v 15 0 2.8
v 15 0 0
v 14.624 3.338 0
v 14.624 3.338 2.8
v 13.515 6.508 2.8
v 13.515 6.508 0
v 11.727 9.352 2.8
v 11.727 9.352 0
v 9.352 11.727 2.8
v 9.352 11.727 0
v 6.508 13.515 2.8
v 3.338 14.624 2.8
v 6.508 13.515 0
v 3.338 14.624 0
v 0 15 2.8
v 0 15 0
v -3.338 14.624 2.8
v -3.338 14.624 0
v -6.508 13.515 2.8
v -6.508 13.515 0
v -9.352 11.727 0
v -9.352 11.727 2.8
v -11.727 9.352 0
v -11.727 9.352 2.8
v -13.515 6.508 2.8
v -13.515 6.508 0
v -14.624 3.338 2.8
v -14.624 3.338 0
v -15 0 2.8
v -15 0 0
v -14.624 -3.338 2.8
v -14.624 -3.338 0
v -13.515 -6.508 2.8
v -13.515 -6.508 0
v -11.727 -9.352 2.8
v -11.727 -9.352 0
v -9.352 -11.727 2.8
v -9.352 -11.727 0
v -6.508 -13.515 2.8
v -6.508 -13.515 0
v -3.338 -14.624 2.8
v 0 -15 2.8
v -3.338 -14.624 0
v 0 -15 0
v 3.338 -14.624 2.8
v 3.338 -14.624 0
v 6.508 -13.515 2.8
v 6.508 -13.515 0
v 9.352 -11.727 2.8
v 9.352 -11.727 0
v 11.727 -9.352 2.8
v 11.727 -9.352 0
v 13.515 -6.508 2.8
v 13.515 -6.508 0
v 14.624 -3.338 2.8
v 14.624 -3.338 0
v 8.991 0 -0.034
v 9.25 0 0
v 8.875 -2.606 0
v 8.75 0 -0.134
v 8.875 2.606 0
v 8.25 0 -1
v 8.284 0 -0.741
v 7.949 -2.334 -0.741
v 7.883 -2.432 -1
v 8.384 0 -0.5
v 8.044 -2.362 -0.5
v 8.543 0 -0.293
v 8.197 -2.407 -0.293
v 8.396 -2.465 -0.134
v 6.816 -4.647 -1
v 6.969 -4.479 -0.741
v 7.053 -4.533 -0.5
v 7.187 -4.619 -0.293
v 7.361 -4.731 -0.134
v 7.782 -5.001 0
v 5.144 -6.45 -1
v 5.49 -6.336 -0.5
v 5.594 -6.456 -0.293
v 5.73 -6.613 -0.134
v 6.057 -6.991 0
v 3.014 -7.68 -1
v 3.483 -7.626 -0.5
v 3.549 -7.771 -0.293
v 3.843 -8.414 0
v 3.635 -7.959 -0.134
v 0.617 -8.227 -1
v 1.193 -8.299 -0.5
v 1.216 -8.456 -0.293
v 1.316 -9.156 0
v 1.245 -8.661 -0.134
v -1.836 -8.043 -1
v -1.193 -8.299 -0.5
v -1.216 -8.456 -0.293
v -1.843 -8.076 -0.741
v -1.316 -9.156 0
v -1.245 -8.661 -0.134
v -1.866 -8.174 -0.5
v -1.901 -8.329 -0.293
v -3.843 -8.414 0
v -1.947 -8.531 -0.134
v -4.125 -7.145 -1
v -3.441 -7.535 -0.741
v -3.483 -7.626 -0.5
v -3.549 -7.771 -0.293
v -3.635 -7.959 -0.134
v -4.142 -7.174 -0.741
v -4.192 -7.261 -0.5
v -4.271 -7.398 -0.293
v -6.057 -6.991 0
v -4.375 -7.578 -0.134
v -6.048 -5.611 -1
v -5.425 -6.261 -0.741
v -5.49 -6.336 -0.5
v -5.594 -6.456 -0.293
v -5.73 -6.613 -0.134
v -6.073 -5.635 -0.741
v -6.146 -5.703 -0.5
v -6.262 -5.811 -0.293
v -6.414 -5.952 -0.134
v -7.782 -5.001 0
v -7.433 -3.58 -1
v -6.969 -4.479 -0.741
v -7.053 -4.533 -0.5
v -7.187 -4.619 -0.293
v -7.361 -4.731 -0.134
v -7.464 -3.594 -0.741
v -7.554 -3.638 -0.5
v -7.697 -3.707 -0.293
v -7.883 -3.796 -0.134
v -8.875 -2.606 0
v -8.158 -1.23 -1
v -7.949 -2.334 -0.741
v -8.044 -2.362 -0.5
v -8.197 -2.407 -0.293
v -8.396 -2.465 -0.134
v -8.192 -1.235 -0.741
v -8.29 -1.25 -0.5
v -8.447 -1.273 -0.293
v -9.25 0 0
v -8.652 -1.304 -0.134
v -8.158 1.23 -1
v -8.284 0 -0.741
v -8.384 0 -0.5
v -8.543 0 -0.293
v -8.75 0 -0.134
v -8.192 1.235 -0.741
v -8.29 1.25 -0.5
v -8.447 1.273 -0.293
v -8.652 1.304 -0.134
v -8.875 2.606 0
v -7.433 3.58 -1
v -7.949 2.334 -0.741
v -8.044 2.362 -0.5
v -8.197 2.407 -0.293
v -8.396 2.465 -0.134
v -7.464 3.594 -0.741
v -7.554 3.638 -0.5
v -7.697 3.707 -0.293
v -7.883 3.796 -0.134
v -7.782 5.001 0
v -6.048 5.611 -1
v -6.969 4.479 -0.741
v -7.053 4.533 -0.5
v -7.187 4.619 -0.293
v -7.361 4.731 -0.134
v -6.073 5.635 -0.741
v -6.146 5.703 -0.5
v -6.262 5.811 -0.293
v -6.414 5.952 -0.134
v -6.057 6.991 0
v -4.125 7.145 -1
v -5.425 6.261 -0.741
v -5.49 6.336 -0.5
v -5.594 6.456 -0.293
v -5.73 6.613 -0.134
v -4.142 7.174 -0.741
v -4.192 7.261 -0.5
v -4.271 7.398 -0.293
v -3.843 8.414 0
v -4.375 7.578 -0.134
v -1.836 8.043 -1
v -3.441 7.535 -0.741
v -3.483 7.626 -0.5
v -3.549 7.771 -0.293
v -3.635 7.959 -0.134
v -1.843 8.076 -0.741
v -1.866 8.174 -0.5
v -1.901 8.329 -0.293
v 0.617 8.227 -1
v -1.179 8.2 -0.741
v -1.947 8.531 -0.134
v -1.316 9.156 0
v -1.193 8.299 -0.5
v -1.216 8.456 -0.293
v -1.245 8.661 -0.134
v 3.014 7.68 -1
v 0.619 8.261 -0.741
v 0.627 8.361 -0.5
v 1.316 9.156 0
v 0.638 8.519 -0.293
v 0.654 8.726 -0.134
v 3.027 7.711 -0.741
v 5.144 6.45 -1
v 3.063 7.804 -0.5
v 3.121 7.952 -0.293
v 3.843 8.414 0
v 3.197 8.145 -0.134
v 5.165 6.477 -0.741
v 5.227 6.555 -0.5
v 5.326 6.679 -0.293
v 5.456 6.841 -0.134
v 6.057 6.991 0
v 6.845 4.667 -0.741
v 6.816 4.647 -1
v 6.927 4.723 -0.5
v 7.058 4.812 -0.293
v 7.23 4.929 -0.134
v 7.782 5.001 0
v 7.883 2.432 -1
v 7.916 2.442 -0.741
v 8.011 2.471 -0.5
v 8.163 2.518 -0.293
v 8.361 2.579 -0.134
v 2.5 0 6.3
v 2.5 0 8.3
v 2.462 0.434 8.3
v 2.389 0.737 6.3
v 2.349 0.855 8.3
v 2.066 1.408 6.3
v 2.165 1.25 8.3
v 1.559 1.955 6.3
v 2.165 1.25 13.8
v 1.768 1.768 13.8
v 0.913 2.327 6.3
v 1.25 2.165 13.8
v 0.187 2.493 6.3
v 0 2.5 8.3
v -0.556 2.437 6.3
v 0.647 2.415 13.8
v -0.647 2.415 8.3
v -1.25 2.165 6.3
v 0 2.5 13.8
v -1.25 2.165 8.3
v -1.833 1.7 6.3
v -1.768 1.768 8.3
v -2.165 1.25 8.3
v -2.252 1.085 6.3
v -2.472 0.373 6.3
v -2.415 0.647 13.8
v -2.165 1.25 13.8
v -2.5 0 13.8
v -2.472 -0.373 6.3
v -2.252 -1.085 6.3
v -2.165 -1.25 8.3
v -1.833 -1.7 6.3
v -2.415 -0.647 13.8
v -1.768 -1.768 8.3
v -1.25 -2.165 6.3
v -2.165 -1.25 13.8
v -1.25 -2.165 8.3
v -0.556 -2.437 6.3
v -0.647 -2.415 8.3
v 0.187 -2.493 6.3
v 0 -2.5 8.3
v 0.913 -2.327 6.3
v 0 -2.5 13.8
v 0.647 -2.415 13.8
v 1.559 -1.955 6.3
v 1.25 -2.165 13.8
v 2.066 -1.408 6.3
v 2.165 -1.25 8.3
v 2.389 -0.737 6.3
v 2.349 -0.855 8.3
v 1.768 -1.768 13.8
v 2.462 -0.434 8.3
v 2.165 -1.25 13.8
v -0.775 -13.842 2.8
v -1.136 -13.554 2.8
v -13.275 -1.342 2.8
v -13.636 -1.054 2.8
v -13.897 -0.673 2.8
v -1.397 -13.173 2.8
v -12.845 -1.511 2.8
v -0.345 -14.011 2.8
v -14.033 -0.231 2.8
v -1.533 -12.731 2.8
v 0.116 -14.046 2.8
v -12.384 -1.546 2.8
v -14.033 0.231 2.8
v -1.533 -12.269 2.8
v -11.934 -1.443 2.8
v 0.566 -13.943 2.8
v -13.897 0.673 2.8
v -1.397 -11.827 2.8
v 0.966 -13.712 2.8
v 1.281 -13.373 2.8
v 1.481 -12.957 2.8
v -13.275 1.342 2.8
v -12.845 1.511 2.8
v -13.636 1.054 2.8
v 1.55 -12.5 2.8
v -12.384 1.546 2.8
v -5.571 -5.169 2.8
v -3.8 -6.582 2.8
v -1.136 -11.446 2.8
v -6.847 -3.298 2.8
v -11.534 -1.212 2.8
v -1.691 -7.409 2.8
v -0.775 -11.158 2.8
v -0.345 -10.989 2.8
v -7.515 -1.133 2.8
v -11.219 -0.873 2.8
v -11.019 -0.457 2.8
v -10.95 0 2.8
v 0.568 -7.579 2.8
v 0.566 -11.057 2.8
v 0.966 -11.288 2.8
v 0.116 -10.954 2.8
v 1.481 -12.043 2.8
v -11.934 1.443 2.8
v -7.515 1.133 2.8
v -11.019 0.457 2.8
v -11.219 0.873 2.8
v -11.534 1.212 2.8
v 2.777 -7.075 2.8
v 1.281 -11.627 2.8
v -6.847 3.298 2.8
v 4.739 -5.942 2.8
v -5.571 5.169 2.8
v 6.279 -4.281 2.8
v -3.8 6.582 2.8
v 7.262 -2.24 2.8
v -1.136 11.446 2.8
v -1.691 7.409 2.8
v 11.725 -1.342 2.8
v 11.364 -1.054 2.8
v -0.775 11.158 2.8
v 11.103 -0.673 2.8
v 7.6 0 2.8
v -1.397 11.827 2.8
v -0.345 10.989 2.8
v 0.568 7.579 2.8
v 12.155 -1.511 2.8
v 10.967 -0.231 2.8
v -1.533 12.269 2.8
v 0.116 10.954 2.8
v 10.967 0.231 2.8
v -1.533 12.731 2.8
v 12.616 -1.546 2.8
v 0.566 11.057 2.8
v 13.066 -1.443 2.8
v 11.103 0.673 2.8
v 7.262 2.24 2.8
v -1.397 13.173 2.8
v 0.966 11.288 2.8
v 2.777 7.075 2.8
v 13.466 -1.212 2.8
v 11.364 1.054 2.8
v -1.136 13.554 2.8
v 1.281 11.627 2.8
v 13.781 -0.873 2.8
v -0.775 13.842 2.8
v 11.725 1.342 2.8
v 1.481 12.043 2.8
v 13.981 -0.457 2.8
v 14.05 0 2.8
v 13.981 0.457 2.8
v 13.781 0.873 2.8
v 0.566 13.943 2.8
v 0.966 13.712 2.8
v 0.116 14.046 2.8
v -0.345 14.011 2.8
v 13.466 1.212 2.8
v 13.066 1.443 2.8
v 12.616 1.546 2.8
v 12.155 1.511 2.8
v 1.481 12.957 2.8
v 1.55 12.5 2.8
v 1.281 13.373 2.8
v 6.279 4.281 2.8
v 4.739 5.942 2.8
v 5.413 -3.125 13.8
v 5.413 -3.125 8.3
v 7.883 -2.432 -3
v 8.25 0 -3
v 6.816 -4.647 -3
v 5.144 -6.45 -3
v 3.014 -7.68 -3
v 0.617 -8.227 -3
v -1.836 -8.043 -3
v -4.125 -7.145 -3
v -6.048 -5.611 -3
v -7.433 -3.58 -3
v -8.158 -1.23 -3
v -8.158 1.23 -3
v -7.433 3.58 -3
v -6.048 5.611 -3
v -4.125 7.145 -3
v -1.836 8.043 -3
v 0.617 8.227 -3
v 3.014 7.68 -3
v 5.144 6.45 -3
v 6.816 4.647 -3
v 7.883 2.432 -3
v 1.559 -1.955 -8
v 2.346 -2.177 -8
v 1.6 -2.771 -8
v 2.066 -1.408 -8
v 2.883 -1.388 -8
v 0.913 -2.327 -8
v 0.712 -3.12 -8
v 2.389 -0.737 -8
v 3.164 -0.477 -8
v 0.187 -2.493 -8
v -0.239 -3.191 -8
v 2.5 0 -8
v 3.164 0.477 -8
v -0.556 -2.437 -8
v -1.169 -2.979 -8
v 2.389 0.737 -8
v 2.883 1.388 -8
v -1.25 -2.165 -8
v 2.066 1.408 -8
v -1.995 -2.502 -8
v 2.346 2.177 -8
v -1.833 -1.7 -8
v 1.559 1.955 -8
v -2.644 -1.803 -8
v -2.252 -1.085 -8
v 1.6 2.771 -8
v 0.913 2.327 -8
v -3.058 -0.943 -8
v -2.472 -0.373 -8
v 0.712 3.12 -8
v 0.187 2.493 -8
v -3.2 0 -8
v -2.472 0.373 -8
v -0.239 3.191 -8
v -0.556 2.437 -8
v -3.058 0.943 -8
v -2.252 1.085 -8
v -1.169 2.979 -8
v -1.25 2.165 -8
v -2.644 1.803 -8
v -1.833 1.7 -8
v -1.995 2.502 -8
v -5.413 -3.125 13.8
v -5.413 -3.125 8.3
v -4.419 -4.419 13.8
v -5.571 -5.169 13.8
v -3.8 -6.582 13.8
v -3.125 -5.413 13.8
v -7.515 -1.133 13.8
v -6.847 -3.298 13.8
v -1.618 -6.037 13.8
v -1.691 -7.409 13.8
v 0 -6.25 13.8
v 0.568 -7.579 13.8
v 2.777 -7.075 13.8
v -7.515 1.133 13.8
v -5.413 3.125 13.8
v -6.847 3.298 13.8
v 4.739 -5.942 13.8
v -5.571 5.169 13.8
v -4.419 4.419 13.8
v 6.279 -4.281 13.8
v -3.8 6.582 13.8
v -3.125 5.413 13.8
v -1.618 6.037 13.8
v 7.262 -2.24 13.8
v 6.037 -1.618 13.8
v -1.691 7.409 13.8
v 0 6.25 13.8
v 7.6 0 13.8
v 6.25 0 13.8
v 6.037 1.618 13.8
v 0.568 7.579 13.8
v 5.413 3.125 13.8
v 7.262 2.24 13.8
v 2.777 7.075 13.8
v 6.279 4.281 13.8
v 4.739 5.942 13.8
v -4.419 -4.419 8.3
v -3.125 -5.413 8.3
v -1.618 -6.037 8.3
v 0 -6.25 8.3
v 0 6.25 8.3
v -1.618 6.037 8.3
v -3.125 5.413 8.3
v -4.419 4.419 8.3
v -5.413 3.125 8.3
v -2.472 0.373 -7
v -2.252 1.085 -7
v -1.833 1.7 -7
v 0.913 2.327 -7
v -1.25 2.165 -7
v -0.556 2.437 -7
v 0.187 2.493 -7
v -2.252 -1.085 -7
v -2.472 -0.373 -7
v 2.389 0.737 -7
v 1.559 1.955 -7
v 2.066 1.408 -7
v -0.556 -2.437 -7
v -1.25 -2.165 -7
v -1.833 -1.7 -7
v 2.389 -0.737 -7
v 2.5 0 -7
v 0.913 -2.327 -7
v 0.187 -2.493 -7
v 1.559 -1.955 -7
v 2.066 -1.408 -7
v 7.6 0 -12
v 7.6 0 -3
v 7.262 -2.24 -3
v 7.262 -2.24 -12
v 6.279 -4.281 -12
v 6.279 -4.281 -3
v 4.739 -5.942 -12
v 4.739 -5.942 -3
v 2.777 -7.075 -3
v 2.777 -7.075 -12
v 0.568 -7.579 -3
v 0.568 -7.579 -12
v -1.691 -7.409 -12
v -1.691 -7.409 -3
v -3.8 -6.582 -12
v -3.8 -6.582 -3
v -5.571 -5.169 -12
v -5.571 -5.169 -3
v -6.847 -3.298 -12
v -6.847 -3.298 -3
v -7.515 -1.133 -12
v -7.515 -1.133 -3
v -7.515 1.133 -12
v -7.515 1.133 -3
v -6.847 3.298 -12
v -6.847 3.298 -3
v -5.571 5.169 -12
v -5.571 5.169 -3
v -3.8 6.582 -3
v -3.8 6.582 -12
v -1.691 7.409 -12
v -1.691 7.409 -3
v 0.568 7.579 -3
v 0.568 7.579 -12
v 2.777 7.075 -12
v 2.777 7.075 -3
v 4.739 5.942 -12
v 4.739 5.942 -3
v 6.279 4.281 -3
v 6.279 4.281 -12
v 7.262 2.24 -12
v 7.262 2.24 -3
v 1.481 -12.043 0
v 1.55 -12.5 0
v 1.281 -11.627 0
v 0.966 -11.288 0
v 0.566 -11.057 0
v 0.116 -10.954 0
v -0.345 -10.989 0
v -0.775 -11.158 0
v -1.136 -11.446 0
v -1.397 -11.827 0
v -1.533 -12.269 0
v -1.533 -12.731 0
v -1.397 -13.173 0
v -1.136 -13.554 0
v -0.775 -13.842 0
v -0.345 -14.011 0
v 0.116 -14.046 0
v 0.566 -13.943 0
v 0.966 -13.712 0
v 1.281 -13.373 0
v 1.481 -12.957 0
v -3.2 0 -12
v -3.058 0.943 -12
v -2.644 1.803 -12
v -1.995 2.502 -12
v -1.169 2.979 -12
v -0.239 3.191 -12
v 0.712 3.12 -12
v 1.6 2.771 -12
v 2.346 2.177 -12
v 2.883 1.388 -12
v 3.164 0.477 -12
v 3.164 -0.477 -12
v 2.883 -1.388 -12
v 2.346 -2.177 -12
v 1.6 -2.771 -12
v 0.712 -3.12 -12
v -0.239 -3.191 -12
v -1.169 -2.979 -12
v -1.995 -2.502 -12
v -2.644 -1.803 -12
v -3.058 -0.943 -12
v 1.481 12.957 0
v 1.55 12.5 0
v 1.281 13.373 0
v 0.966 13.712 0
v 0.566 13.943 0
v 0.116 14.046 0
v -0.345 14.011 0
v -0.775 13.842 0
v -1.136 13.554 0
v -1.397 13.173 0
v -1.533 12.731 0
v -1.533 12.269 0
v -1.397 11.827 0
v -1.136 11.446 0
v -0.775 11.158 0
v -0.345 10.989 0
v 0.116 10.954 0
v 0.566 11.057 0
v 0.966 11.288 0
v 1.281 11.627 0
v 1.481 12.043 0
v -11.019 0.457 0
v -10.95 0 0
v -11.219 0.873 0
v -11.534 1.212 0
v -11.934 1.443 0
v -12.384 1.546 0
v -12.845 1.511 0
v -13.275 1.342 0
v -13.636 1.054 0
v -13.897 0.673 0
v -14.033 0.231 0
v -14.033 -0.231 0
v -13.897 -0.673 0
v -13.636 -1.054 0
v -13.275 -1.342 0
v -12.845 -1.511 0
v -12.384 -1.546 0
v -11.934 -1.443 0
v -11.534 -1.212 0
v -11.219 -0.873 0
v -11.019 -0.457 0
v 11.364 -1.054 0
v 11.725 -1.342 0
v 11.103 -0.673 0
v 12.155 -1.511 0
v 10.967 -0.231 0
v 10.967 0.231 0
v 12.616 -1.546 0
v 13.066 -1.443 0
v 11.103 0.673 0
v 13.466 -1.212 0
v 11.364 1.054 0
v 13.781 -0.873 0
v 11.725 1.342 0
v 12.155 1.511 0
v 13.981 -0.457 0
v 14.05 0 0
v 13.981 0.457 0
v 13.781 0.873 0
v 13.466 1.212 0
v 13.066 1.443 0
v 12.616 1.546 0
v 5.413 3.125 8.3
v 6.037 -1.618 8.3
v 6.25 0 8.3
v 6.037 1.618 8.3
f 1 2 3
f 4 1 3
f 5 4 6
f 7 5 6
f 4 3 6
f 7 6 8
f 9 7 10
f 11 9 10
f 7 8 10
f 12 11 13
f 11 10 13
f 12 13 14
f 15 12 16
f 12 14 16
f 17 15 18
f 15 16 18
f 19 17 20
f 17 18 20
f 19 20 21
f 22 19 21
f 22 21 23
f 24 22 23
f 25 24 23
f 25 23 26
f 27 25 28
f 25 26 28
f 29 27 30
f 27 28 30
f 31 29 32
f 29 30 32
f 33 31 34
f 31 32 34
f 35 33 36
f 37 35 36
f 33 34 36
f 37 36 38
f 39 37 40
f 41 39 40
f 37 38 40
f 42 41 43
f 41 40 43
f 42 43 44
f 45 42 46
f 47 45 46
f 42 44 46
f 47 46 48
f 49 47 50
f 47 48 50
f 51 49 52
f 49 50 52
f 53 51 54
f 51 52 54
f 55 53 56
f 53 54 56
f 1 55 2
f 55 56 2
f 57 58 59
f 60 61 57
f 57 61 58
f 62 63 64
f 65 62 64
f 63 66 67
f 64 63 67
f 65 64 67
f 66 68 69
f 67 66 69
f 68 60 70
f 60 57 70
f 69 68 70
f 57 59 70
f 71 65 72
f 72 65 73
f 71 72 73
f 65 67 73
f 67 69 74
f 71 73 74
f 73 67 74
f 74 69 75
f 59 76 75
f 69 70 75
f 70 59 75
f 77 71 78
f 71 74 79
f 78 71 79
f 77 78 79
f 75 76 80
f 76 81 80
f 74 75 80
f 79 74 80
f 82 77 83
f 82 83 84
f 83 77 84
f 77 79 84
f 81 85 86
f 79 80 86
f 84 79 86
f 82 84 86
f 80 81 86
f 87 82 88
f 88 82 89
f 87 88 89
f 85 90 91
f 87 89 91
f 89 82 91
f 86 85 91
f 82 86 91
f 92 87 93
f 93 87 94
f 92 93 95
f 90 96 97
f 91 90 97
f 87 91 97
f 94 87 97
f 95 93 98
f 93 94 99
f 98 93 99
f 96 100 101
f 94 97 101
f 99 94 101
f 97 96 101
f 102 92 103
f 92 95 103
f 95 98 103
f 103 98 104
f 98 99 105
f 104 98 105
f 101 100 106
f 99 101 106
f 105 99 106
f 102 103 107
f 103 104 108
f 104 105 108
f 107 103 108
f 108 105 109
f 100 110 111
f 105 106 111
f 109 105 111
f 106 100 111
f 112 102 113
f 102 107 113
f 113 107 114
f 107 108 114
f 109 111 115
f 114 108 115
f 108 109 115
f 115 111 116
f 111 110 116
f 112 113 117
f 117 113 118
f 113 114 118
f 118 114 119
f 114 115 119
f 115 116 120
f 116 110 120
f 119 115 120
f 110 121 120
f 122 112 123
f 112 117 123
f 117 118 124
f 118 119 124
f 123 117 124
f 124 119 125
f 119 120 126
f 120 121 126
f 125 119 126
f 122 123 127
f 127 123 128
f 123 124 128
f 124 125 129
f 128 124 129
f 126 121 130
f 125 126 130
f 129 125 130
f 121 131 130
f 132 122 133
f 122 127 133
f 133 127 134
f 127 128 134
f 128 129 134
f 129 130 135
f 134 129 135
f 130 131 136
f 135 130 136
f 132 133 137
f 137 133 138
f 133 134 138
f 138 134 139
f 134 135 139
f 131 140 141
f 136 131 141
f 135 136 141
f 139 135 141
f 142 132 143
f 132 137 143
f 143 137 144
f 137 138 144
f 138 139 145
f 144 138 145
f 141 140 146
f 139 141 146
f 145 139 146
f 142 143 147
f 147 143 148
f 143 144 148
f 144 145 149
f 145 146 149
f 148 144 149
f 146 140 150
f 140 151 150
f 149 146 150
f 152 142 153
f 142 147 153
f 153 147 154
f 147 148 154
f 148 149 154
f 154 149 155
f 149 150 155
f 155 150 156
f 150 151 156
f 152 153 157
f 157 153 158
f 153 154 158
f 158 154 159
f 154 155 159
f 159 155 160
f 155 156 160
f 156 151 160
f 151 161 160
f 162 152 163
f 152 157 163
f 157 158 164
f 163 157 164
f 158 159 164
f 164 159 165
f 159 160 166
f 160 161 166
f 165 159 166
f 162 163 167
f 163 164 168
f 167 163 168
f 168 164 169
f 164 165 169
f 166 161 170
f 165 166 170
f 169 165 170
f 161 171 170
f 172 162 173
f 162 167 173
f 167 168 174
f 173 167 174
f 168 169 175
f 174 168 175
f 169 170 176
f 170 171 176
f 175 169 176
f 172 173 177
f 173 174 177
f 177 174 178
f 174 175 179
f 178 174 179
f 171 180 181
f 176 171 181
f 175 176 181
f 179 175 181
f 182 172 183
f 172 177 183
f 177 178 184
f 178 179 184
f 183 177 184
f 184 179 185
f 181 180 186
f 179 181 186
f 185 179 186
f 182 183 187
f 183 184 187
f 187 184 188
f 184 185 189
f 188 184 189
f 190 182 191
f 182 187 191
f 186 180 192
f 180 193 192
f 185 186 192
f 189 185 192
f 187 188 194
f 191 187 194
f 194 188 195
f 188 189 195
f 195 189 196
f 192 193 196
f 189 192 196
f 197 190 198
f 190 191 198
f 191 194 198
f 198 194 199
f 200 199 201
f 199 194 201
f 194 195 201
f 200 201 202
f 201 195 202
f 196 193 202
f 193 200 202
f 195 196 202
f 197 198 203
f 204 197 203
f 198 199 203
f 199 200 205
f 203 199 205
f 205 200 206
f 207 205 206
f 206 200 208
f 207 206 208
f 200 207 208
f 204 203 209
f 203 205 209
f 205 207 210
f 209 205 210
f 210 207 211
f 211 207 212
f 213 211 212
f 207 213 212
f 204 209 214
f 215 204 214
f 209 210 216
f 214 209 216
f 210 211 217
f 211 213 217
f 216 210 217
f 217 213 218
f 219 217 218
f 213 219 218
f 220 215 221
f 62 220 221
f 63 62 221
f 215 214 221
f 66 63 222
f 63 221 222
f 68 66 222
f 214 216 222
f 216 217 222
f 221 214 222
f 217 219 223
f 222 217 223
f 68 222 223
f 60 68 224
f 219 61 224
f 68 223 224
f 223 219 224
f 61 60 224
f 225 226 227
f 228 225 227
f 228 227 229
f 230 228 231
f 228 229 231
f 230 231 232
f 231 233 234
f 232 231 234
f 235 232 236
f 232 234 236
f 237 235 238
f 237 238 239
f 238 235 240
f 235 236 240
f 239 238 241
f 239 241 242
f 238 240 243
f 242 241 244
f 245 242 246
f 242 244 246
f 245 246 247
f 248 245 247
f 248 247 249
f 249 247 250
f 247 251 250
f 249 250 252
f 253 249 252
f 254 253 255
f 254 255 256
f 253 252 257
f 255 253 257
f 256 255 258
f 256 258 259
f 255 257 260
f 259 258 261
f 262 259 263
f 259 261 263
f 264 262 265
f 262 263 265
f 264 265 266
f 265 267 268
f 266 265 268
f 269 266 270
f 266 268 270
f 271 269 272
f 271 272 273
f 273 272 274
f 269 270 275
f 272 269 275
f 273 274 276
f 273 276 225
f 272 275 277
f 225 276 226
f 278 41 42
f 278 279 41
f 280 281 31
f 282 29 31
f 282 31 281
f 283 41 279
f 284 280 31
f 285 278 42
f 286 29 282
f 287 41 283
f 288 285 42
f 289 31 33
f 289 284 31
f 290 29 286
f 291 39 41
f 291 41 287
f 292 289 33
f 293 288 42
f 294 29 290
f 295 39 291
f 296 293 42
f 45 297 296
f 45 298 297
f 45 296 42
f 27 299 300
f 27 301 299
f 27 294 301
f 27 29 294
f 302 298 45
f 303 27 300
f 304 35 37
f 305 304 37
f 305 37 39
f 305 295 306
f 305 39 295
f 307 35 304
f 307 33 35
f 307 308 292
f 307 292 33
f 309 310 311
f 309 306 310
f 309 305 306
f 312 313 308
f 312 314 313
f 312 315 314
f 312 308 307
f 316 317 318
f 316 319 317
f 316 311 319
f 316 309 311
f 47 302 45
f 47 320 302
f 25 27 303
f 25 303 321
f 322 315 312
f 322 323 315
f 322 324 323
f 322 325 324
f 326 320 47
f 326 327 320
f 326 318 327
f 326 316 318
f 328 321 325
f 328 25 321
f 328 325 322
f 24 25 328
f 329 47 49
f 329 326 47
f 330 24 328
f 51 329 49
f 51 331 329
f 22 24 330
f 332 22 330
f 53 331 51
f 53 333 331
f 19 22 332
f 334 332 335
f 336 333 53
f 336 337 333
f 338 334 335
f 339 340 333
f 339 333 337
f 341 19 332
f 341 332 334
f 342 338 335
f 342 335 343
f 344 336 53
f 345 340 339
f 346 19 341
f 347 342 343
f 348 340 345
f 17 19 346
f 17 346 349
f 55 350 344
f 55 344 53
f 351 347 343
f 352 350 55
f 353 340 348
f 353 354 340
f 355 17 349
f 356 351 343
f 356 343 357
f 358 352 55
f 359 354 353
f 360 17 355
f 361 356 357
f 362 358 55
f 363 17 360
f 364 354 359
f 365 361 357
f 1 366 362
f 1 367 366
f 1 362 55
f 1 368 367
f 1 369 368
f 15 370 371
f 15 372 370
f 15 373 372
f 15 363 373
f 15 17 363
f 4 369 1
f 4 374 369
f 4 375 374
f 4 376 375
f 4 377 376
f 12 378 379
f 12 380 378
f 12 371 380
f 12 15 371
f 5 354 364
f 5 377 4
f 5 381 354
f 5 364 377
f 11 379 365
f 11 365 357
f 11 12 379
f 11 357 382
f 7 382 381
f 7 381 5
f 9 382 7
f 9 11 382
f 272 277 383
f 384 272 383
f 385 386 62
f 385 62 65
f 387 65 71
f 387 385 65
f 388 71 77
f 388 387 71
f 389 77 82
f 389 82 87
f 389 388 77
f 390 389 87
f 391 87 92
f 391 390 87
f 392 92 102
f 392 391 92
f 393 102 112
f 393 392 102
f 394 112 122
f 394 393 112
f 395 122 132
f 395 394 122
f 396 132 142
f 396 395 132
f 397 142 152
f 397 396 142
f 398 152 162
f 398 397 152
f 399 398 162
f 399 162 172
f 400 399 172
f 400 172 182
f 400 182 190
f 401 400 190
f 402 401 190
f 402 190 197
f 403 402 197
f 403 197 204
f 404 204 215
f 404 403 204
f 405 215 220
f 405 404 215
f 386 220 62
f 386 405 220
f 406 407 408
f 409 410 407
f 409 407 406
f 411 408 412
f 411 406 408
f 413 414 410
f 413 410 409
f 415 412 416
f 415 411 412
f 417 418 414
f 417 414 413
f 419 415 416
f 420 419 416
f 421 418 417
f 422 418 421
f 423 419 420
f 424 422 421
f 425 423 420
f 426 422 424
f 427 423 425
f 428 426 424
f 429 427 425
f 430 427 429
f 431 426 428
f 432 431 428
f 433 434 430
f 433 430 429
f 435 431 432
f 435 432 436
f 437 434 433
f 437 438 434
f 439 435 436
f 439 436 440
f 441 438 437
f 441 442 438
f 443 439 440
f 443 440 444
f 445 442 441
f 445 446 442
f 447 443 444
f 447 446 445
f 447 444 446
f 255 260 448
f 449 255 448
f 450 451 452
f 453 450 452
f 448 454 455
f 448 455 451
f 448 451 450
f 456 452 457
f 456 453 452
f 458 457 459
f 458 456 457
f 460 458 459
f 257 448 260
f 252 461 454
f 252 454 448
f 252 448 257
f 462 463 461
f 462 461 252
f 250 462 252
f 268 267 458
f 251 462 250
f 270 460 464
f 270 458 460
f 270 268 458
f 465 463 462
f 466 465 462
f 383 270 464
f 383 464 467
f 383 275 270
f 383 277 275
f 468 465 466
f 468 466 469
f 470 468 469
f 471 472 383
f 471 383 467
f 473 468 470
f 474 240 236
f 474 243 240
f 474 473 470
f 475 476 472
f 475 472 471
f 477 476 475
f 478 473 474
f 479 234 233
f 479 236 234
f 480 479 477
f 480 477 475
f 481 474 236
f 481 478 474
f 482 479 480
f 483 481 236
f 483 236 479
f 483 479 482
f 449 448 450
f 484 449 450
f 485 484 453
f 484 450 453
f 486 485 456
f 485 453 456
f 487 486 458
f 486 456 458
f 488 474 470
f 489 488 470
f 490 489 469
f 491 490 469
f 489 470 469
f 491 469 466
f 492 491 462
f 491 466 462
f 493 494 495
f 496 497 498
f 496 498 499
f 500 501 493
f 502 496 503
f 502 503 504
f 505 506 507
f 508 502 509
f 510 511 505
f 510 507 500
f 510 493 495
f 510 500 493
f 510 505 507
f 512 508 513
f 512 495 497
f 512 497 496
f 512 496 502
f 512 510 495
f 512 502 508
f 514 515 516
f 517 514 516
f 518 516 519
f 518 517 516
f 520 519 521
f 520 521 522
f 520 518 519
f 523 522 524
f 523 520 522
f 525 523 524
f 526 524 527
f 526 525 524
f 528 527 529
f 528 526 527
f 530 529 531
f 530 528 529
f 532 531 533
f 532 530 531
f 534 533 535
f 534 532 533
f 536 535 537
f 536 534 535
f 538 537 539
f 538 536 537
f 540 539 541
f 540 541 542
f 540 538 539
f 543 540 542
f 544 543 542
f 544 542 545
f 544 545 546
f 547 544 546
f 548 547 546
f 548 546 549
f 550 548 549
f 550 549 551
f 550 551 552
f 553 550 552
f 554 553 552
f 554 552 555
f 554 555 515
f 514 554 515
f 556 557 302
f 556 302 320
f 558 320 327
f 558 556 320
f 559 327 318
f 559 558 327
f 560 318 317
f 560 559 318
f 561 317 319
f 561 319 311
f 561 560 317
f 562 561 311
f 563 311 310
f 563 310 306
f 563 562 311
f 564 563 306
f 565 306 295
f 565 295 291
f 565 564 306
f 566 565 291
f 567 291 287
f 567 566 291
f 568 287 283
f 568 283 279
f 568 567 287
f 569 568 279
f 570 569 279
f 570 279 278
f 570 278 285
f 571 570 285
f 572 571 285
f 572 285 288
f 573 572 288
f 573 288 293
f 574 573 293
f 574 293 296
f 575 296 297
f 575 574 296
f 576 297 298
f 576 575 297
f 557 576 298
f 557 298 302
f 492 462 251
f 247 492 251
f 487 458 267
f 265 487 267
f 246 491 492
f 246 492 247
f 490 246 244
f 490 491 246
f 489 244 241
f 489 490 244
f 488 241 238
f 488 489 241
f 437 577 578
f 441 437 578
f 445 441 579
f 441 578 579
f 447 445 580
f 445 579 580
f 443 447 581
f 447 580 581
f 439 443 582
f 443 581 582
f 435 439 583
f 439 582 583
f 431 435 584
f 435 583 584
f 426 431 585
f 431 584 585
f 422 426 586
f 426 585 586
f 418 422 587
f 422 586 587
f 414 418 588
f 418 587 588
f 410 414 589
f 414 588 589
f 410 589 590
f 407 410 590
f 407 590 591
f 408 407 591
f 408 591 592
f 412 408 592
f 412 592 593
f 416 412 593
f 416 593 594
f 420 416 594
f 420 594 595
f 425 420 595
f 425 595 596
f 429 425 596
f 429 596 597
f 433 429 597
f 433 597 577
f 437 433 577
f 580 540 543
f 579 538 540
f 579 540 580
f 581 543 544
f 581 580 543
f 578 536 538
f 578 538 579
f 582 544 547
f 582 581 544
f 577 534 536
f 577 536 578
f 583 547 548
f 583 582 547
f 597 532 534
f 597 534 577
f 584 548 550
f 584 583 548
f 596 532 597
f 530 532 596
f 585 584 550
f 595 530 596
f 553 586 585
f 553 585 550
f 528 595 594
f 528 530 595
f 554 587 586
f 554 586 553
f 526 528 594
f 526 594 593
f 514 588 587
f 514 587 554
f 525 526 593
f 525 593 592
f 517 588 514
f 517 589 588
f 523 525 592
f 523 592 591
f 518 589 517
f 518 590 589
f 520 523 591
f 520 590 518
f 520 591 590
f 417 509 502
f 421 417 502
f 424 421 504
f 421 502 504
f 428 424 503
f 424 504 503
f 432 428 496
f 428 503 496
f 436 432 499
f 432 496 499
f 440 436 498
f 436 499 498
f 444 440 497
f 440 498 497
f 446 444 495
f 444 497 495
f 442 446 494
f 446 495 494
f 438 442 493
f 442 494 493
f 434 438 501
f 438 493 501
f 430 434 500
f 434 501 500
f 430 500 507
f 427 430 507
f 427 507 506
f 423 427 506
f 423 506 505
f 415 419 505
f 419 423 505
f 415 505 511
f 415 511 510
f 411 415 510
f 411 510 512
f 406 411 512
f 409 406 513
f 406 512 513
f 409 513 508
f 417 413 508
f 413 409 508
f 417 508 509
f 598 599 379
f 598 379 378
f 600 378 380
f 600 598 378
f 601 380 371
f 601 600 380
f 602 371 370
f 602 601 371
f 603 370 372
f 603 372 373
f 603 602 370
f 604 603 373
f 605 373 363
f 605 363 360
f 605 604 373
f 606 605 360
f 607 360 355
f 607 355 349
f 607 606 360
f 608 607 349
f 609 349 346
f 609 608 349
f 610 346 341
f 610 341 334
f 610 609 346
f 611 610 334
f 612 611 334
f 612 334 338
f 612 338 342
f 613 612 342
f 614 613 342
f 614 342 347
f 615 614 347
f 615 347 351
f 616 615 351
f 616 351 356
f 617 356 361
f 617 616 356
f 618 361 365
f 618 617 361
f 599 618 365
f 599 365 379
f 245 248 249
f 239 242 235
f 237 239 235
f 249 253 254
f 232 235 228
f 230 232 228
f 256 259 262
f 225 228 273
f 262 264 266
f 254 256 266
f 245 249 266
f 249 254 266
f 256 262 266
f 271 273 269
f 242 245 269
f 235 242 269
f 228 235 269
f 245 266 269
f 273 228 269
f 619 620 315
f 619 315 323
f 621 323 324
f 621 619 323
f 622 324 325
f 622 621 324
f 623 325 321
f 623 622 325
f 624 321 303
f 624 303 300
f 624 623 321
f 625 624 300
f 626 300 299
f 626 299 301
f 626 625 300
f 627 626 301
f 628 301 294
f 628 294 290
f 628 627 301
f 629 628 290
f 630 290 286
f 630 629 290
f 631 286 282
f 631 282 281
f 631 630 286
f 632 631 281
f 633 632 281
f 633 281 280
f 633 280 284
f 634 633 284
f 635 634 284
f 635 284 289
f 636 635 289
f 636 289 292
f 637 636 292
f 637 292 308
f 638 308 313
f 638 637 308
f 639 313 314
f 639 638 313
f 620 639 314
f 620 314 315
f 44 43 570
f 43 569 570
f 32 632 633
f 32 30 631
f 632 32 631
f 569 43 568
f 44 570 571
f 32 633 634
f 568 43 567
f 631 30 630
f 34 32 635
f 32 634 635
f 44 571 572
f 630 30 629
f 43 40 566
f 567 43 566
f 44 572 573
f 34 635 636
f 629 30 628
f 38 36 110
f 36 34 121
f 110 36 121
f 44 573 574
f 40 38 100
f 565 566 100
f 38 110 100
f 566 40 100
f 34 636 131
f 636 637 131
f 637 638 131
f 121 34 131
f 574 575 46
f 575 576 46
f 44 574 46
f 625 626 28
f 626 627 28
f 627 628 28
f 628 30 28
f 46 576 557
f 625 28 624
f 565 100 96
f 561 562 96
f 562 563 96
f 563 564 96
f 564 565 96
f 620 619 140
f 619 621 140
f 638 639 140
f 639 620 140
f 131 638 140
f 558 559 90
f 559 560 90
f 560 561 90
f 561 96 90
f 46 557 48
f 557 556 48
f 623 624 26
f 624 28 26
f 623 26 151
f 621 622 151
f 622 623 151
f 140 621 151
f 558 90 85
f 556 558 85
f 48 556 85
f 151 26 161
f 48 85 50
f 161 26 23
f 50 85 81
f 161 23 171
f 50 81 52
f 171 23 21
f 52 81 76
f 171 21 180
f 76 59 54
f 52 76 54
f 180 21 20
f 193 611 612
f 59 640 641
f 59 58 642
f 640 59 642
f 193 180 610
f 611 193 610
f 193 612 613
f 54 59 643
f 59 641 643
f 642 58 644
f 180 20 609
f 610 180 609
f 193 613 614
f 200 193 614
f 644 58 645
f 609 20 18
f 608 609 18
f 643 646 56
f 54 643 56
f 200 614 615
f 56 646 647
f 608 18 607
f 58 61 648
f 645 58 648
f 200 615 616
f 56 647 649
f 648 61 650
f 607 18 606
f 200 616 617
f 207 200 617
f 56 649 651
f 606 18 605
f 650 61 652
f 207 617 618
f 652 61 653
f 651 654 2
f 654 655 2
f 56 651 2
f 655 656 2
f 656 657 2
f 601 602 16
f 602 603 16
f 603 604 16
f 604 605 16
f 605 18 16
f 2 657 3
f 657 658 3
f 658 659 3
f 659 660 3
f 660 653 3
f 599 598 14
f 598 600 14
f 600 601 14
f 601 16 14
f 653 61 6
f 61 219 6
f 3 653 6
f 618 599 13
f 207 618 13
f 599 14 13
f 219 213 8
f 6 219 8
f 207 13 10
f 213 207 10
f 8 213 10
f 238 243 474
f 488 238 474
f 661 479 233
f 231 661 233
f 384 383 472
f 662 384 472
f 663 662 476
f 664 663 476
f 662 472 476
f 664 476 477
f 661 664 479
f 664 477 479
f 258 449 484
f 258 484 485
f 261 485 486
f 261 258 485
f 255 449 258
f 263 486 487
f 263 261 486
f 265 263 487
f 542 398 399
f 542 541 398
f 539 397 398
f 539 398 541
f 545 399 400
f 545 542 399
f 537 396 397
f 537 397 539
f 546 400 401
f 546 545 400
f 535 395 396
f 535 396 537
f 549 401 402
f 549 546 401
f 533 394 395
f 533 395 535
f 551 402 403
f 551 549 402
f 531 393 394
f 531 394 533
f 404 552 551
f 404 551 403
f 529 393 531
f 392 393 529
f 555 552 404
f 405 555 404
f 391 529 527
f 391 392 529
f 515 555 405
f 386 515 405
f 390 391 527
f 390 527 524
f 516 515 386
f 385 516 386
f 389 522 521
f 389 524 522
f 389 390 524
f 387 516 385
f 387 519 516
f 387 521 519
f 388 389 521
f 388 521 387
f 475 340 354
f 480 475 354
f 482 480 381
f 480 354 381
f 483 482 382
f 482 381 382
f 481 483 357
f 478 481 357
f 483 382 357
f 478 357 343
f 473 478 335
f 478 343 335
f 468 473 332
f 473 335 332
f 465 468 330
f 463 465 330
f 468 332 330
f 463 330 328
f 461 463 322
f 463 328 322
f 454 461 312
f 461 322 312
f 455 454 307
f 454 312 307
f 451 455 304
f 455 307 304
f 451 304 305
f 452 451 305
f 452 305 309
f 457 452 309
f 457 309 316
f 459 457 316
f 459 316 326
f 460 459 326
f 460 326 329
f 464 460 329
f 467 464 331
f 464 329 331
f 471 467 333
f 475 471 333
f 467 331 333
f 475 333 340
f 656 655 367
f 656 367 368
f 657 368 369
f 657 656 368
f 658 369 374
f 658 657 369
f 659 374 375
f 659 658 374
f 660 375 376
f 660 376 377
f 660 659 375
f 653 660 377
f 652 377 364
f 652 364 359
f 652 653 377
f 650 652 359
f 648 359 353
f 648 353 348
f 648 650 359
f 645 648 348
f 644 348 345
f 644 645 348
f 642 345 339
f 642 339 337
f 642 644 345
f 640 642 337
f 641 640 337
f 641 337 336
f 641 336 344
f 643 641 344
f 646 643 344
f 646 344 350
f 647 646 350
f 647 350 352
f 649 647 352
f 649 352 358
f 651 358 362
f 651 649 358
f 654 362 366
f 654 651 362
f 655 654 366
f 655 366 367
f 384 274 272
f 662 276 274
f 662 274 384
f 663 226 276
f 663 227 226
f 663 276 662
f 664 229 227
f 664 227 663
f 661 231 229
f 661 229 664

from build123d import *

# Parameters (mm, degrees)
SKETCH1_R               = 15
SKETCH1_R_2             = 1.55
BOSS_EXTRUDE1_DEPTH     = 2.8
BOSS_EXTRUDE2_START     = 2.8
SKETCH3_R               = 7.6
BOSS_EXTRUDE2_DEPTH     = 11
CUT_EXTRUDE1_DEPTH      = 26.306916051
CUT_EXTRUDE1_DEPTH_BACK = 26.306916051
SKETCH4_R               = 2.5
SKETCH5_R               = 5
CUT_EXTRUDE2_DEPTH      = 5.5
BOSS_EXTRUDE3_START     = 12
SKETCH7_R               = 7.6
SKETCH7_R_2             = 3.2
BOSS_EXTRUDE3_DEPTH     = 12
SKETCH8_R               = 3.2
SKETCH8_R_2             = 2.5
BOSS_EXTRUDE4_DEPTH     = 8
BOSS_EXTRUDE5_START     = 3
SKETCH9_R               = 8.25
SKETCH9_R_2             = 7.6
BOSS_EXTRUDE5_DEPTH     = 3
FILLET2_R               = 1
BOSS_EXTRUDE6_START     = 5.5
SKETCH11_R              = 5
SKETCH11_R_2            = 2.5
BOSS_EXTRUDE6_DEPTH     = 5.5
CUT_EXTRUDE3_DEPTH      = 5.5
BOSS_EXTRUDE7_START     = -18.3
SKETCH12_R              = 2.5
BOSS_EXTRUDE7_DEPTH     = 13.3


with BuildPart() as part:
    # Sketch1 → Boss-Extrude1 (new body)
    with BuildSketch(Plane.XY):
        Circle(SKETCH1_R)
        with Locations((0, 12.5)):
            Circle(SKETCH1_R_2, mode=Mode.SUBTRACT)
        with Locations((12.5, 0)):
            Circle(SKETCH1_R_2, mode=Mode.SUBTRACT)
        with Locations((0, -12.5)):
            Circle(SKETCH1_R_2, mode=Mode.SUBTRACT)
        with Locations((-12.5, 0)):
            Circle(SKETCH1_R_2, mode=Mode.SUBTRACT)
    extrude(amount=BOSS_EXTRUDE1_DEPTH)

    # Sketch3 → Boss-Extrude2 (add)
    with BuildSketch(Plane.XY.offset(BOSS_EXTRUDE2_START)):
        Circle(SKETCH3_R)
    extrude(amount=BOSS_EXTRUDE2_DEPTH)

    # Sketch4 → Cut-Extrude1 (cut, two sides: drawn at the far end of the back side and taken through both)
    with BuildSketch(Plane.XY.offset(13.8).offset(-CUT_EXTRUDE1_DEPTH_BACK)):
        Circle(SKETCH4_R)
    extrude(amount=CUT_EXTRUDE1_DEPTH + CUT_EXTRUDE1_DEPTH_BACK, mode=Mode.SUBTRACT)

    # Sketch5 → Cut-Extrude2 (cut)
    with BuildSketch(Plane.XY.offset(13.8)):
        Circle(SKETCH5_R)
    extrude(amount=-CUT_EXTRUDE2_DEPTH, mode=Mode.SUBTRACT)

    # Sketch7 → Boss-Extrude3 (add)
    with BuildSketch(Plane(origin=(0, 0, 0), x_dir=(-1, 0, 0), z_dir=(0, 0, -1)).offset(BOSS_EXTRUDE3_START)):
        with Locations(Location((0, 0, 0), (0, 0, 180))):
            Circle(SKETCH7_R)
        Circle(SKETCH7_R_2, mode=Mode.SUBTRACT)
    extrude(amount=-BOSS_EXTRUDE3_DEPTH)

    # Sketch8 → Boss-Extrude4 (add)
    with BuildSketch(Plane(origin=(0, 0, 0), x_dir=(-1, 0, 0), z_dir=(0, 0, -1))):
        Circle(SKETCH8_R)
        with Locations(Location((0, 0, 0), (0, 0, 180))):
            Circle(SKETCH8_R_2, mode=Mode.SUBTRACT)
    extrude(amount=BOSS_EXTRUDE4_DEPTH)

    # Sketch9 → Boss-Extrude5 (add)
    with BuildSketch(Plane(origin=(0, 0, 0), x_dir=(-1, 0, 0), z_dir=(0, 0, -1)).offset(BOSS_EXTRUDE5_START)):
        with Locations(Location((0, 0, 0), (0, 0, 180))):
            Circle(SKETCH9_R)
        with Locations(Location((0, 0, 0), (0, 0, 180))):
            Circle(SKETCH9_R_2, mode=Mode.SUBTRACT)
    extrude(amount=-BOSS_EXTRUDE5_DEPTH)

    # Fillet2
    fillet2_edges = [part.edges().sort_by_distance(p)[0] for p in [
        (-8.25, 0, 0),
    ]]
    fillet(fillet2_edges, radius=FILLET2_R)

    # Sketch11 → Boss-Extrude6 (add)
    with BuildSketch(Plane.XY.offset(8.3).offset(BOSS_EXTRUDE6_START)):
        Circle(SKETCH11_R)
        Circle(SKETCH11_R_2, mode=Mode.SUBTRACT)
    extrude(amount=-BOSS_EXTRUDE6_DEPTH)

    # Sketch10 → Cut-Extrude3 (cut)
    with BuildSketch(Plane.XY.offset(13.8)):
        with BuildLine():
            Line((0, 0), (5.412658774, -3.125))
            ThreePointArc((5.412658774, -3.125), (6.25, 0), (5.412658774, 3.125))
            Line((5.412658774, 3.125), (0, 0))
        make_face()
        with BuildLine():
            Line((-5.412658774, 3.125), (0, 0))
            Line((0, 0), (0, 6.25))
            ThreePointArc((0, 6.25), (-3.125, 5.412658774), (-5.412658774, 3.125))
        make_face()
        with BuildLine():
            Line((0, -6.25), (0, 0))
            Line((0, 0), (-5.412658774, -3.125))
            ThreePointArc((-5.412658774, -3.125), (-3.125, -5.412658774), (0, -6.25))
        make_face()
    extrude(amount=-CUT_EXTRUDE3_DEPTH, mode=Mode.SUBTRACT)

    # Sketch12 → Boss-Extrude7 (add)
    with BuildSketch(Plane(origin=(0, 0, -12), x_dir=(-1, 0, 0), z_dir=(0, 0, -1)).offset(BOSS_EXTRUDE7_START)):
        with Locations(Location((0, 0, 0), (0, 0, 180))):
            Circle(SKETCH12_R)
    extrude(amount=BOSS_EXTRUDE7_DEPTH)


solid = part.part
